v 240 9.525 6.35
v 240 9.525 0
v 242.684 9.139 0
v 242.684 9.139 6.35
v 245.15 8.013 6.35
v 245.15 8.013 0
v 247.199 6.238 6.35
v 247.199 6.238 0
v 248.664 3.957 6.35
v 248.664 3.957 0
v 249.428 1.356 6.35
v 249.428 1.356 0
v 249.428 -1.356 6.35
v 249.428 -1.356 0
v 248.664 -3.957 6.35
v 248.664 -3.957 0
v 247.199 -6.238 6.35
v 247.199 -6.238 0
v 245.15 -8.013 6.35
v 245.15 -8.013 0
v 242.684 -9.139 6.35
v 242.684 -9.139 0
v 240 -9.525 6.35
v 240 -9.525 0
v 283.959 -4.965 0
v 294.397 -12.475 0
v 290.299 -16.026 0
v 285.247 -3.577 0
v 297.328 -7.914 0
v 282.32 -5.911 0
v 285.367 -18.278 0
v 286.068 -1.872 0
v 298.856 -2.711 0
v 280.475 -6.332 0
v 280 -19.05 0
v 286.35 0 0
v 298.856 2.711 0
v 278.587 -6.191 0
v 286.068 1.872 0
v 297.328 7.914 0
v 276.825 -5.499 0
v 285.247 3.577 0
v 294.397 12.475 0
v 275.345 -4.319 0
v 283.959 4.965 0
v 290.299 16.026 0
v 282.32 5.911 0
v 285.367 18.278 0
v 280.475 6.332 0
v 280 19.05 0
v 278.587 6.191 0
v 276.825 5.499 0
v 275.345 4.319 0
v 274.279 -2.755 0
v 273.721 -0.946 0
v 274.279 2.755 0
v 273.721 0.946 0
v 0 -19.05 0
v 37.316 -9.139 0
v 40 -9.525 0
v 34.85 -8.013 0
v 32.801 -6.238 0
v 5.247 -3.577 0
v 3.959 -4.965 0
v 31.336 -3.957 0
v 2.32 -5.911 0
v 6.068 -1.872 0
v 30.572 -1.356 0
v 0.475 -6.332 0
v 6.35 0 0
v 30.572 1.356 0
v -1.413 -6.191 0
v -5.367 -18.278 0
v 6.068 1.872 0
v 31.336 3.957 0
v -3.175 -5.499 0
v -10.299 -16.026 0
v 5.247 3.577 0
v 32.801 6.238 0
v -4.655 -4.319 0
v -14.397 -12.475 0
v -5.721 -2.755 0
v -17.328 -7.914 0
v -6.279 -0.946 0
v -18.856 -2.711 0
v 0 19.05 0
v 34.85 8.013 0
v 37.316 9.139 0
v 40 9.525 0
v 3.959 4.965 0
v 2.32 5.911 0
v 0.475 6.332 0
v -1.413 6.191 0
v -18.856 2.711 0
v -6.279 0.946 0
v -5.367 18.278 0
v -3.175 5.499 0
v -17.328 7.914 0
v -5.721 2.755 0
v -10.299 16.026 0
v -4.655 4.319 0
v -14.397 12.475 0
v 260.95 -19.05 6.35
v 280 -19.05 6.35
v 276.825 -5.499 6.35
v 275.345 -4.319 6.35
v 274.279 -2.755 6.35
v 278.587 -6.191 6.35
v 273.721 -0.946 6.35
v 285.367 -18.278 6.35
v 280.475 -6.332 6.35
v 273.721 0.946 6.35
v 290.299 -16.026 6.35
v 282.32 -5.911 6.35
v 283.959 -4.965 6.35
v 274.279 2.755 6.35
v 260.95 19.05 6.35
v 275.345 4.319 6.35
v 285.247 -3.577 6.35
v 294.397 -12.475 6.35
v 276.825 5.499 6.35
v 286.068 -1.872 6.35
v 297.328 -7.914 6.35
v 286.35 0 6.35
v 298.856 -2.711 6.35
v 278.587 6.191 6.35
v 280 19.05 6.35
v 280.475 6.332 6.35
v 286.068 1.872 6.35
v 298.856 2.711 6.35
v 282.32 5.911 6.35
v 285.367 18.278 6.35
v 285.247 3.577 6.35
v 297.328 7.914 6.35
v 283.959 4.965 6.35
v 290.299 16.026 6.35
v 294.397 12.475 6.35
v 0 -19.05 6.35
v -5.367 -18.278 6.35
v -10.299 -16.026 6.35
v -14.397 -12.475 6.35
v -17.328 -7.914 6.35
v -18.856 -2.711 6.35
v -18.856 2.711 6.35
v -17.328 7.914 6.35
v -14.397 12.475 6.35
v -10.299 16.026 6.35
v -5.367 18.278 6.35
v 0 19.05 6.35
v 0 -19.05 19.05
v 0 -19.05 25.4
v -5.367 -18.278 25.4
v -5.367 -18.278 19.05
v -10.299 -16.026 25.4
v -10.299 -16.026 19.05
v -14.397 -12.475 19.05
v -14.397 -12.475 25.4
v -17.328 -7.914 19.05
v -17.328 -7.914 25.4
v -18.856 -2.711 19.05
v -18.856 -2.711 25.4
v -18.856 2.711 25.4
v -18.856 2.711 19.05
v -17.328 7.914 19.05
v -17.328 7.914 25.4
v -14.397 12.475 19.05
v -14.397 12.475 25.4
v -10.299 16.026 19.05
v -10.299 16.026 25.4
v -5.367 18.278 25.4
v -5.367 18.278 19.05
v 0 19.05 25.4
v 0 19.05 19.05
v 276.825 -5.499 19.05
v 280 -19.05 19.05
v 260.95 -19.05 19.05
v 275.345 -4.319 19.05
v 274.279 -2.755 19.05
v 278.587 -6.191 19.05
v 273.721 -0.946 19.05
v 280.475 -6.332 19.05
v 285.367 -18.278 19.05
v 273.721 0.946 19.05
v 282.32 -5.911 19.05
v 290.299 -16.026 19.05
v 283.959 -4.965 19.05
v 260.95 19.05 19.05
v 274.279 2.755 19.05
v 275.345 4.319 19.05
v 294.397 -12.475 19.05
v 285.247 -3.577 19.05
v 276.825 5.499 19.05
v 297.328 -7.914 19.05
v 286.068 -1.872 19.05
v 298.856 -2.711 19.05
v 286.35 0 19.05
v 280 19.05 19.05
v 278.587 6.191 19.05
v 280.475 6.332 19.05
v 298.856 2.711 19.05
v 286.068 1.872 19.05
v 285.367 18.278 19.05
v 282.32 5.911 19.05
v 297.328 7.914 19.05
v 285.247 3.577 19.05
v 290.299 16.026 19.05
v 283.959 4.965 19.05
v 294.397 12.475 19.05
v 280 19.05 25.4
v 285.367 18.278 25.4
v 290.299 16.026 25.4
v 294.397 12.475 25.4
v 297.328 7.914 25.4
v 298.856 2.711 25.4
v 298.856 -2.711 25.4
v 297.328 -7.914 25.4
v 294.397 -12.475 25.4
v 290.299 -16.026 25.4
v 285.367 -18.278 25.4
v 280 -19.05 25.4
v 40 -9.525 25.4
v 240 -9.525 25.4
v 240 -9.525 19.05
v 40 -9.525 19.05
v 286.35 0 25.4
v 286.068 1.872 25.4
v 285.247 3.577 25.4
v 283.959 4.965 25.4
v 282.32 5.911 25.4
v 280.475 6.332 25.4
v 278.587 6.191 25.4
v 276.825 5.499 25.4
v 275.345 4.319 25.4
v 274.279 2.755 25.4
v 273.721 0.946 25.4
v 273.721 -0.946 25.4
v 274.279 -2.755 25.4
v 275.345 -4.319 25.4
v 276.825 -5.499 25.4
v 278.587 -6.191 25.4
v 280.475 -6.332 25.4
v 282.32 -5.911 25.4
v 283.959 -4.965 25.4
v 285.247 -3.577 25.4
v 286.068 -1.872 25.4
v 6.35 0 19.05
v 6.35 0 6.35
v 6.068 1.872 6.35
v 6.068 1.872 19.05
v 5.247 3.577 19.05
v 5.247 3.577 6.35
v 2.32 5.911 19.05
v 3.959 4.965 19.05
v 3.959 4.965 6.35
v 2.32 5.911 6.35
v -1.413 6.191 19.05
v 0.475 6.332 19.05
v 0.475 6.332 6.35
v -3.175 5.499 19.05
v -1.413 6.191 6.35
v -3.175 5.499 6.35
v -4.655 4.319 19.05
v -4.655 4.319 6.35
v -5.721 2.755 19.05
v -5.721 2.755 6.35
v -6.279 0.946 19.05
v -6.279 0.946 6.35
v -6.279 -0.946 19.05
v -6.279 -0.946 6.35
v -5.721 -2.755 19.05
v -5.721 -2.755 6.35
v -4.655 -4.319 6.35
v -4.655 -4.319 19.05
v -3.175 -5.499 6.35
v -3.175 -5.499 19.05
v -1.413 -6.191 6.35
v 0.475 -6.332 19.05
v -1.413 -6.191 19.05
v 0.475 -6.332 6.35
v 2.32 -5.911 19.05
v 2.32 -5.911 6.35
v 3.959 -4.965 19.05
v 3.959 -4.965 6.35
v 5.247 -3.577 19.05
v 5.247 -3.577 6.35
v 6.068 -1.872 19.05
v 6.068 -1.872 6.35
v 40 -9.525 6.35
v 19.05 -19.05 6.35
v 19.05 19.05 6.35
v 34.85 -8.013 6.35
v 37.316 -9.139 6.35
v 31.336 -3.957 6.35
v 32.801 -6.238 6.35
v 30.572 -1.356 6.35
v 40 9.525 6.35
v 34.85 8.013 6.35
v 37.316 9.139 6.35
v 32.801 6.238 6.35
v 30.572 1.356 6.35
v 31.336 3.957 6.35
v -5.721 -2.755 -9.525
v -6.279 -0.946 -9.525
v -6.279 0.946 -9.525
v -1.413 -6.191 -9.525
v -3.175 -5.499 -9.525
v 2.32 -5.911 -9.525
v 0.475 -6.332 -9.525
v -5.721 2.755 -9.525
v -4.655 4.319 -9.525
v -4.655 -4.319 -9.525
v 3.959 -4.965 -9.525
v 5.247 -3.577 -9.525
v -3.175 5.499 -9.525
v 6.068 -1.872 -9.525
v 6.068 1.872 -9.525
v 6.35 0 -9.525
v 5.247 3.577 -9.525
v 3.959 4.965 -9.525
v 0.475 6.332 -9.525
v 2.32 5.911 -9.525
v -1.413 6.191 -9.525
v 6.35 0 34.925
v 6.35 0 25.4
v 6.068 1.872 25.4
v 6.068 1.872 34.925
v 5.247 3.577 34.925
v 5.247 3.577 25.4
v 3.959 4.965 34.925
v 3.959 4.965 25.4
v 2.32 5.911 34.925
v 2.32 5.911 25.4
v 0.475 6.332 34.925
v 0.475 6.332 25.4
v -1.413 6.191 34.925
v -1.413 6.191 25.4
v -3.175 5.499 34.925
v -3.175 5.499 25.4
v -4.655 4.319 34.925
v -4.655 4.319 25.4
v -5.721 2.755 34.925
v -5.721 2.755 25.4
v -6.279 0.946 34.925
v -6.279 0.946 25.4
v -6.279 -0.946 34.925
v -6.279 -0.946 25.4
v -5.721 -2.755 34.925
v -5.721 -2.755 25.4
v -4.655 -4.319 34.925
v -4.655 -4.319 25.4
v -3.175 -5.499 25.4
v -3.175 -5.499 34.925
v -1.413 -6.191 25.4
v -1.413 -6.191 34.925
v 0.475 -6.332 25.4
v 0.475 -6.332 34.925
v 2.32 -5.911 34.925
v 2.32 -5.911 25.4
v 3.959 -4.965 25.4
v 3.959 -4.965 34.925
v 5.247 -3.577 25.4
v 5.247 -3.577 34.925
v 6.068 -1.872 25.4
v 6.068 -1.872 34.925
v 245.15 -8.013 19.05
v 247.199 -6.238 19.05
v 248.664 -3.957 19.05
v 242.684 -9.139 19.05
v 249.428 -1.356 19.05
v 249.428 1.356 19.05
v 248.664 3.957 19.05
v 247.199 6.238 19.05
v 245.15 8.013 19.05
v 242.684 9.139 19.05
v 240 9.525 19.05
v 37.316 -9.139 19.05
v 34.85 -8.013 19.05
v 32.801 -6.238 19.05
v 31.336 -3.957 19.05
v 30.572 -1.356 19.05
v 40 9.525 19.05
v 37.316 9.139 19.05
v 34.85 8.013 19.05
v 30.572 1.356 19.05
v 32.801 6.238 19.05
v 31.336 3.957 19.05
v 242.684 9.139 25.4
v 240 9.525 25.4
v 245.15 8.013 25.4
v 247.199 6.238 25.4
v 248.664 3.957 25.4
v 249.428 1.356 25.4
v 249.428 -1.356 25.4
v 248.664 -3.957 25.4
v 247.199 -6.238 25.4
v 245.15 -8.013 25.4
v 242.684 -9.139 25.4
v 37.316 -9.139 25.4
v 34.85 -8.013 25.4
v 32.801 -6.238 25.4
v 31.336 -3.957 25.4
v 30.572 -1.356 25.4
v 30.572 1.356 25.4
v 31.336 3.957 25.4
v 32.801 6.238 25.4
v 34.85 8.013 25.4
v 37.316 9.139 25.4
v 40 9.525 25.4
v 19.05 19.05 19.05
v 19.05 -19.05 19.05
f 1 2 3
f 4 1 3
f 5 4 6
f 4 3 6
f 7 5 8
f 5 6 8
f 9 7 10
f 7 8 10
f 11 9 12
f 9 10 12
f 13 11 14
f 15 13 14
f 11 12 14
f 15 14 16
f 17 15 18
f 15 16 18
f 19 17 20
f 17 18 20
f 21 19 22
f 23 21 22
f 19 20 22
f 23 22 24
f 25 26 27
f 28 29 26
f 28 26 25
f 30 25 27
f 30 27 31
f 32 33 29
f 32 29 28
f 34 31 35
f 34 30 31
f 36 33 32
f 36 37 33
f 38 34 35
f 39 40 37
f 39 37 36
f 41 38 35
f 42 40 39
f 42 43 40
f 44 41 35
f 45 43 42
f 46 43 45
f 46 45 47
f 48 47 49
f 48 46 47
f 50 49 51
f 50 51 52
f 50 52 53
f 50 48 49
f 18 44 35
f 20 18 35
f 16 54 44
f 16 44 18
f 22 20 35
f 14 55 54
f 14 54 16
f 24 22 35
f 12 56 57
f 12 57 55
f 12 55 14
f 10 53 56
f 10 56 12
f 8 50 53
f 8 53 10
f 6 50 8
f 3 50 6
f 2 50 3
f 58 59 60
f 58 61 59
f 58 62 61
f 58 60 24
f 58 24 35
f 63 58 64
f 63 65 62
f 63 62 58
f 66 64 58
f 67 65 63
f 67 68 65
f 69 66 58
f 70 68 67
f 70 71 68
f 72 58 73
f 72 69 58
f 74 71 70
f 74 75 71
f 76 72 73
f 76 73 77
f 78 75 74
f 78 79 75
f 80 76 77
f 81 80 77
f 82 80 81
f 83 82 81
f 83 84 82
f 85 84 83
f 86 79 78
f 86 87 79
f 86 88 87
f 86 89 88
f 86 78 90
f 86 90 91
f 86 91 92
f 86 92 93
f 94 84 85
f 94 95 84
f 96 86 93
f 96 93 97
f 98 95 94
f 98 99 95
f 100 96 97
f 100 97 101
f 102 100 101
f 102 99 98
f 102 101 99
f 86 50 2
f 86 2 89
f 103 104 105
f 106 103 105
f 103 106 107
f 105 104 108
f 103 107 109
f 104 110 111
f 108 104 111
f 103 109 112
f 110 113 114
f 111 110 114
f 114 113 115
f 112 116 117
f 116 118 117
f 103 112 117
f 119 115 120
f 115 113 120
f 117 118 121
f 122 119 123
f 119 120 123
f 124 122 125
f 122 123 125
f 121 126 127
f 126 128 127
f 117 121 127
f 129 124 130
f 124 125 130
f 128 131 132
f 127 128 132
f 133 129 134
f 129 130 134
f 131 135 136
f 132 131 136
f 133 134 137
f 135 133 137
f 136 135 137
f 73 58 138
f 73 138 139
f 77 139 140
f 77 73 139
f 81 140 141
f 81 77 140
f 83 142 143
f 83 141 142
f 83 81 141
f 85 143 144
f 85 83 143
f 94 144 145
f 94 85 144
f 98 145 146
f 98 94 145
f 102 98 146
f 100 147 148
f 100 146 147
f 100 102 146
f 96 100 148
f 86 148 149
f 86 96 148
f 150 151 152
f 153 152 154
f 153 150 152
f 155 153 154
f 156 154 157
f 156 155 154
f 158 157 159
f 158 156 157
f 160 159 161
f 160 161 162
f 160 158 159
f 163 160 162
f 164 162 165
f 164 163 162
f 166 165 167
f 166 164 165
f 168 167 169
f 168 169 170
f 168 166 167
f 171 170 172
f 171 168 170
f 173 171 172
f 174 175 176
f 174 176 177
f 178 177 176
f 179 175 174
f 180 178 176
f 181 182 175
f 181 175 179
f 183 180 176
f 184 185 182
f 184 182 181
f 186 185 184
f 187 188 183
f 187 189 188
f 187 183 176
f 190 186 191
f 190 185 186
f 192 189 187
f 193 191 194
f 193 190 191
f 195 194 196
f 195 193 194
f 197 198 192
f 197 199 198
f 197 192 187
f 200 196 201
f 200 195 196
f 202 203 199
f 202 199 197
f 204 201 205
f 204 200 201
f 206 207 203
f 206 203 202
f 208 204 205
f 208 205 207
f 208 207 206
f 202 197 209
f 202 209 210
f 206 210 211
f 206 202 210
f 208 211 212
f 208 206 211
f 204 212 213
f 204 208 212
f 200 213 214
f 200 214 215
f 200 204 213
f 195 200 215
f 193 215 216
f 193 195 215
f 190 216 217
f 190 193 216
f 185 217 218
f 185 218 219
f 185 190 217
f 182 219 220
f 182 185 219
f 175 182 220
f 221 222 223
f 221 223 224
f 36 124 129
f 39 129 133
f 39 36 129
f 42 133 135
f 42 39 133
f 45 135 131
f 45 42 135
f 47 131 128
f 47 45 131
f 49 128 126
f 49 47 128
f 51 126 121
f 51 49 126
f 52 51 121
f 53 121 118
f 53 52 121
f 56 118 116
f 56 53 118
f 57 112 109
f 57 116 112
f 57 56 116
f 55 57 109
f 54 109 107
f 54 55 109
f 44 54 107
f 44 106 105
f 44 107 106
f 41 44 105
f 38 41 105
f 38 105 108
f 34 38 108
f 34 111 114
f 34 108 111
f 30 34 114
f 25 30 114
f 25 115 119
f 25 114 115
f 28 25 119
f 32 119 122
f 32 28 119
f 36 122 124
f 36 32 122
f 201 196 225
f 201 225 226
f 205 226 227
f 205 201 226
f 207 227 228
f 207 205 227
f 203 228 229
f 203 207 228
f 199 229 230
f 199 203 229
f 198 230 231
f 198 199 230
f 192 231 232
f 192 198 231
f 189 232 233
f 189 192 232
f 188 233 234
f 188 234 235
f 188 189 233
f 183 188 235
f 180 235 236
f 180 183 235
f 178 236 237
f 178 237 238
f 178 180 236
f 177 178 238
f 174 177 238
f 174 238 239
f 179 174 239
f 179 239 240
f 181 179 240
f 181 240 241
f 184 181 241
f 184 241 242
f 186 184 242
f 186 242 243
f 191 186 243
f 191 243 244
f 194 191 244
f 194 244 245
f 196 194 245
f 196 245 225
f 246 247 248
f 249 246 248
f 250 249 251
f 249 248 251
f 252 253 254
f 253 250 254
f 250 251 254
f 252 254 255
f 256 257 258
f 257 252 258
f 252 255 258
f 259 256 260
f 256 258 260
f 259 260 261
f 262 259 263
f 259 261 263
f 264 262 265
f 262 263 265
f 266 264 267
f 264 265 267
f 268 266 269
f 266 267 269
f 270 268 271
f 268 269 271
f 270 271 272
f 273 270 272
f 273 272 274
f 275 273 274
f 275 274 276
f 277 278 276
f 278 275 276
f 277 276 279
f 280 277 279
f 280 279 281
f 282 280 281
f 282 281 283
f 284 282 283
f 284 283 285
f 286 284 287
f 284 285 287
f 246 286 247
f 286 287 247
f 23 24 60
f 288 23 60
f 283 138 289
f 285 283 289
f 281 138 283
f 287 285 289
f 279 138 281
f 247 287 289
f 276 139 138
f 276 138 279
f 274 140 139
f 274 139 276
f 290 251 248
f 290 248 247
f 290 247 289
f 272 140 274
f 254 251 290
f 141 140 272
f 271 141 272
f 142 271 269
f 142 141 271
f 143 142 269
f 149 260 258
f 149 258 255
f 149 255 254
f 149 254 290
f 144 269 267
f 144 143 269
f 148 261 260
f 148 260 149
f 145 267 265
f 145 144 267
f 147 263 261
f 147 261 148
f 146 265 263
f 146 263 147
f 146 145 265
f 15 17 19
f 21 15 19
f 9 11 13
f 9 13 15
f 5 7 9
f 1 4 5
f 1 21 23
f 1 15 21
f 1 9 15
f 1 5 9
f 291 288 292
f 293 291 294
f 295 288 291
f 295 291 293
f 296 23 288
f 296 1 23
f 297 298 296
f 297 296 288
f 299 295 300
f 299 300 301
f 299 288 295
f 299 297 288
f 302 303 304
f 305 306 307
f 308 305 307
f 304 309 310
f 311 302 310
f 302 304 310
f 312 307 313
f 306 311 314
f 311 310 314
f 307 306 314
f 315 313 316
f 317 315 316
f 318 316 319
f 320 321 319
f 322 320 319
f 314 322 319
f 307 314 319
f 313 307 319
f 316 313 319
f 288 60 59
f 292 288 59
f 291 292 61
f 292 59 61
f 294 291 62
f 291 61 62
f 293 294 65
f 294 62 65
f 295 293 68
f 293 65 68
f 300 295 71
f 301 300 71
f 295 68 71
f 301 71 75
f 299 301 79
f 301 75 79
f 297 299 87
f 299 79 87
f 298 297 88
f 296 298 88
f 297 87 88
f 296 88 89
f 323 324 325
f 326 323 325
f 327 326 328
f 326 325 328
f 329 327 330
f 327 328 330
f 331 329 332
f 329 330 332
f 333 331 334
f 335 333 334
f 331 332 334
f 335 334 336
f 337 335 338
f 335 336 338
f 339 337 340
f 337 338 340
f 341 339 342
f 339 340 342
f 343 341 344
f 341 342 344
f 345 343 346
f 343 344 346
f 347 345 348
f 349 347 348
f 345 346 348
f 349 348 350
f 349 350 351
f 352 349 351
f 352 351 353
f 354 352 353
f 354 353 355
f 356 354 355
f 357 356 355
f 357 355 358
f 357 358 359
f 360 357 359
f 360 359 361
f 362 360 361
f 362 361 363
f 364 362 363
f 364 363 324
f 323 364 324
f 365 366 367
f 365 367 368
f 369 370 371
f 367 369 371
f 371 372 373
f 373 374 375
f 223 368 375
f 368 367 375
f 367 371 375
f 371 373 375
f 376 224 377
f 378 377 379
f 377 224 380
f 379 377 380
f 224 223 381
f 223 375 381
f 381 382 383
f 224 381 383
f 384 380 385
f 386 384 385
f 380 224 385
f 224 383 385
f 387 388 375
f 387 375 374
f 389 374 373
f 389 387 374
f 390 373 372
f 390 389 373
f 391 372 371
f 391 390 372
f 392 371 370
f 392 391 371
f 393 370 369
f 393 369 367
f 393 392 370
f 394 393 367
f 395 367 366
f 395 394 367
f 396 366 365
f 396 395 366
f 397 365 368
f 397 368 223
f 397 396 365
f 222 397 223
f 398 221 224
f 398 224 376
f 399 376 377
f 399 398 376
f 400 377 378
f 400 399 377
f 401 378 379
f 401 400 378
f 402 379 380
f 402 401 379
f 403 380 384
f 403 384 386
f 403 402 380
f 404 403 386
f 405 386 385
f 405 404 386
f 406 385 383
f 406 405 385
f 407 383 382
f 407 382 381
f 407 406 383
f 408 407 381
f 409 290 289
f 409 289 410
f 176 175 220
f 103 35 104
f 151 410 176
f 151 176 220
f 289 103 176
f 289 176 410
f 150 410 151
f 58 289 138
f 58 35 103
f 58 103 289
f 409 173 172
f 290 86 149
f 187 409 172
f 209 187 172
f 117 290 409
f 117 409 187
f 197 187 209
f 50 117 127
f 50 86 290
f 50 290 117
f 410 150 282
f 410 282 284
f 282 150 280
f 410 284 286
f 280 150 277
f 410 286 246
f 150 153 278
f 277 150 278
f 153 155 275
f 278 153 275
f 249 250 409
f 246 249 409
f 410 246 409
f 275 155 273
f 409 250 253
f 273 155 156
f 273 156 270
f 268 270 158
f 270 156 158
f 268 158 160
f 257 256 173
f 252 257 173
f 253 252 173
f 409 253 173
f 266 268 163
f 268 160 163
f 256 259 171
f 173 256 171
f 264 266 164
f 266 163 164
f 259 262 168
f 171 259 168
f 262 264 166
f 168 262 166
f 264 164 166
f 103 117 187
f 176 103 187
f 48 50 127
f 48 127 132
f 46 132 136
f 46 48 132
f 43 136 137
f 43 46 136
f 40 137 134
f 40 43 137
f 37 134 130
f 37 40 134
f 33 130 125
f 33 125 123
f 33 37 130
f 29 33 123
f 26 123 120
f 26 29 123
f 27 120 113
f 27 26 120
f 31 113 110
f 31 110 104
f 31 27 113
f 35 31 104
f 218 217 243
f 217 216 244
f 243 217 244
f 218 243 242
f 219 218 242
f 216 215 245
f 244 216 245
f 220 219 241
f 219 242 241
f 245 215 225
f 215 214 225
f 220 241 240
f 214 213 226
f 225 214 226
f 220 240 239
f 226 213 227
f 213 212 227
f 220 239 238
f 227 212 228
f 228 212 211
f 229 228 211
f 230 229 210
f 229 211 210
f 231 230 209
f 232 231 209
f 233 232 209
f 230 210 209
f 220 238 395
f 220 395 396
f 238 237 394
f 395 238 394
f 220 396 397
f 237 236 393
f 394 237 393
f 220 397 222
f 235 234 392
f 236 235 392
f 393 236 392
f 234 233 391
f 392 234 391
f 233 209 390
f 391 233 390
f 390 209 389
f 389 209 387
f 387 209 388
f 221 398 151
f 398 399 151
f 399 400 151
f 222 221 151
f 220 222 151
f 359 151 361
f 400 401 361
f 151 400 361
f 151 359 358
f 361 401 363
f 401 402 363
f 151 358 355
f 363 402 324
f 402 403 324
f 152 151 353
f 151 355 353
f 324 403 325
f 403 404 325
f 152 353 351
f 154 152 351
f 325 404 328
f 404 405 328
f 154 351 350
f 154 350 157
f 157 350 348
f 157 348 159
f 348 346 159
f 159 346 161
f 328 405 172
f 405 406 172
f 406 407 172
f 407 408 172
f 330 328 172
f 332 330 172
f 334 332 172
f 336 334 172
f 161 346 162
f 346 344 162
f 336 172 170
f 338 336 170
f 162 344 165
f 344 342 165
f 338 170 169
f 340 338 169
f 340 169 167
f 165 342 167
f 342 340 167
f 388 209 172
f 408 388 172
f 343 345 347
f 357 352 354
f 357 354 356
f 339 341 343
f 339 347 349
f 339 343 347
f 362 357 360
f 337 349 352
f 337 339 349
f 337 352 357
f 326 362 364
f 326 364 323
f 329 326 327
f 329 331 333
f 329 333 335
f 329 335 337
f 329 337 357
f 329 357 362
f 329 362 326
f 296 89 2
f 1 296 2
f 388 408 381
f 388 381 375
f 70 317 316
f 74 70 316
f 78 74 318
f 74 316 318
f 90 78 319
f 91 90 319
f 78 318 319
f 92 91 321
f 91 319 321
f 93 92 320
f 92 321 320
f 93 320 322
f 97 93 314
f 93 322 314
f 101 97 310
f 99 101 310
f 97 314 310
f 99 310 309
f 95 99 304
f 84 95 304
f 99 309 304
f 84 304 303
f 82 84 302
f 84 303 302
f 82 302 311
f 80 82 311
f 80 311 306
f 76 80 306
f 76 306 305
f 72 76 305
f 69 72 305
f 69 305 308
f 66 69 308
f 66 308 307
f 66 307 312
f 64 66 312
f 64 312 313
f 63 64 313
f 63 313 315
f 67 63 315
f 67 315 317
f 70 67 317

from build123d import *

# Parameters (mm, degrees)
SKETCH1_R                = 6.35
BOSS_EXTRUDE1_DEPTH      = 25.4
CUT_EXTRUDE1_DEPTH       = 6.35
SKETCH3_W                = 12.7
SKETCH3_H                = 38.1
CUT_EXTRUDE2_DEPTH       = 38.1
BOSS_EXTRUDE3_DEPTH      = 9.525
BOSS_EXTRUDE3_DEPTH_BACK = 34.925
SKETCH5_R                = 6.35


with BuildPart() as part:
    # Sketch1 → Boss-Extrude1 (new body)
    with BuildSketch(Plane.XY):
        with BuildLine():
            Line((0, 19.05), (280, 19.05))
            ThreePointArc((280, 19.05), (299.05, 0), (280, -19.05))
            Line((280, -19.05), (0, -19.05))
            ThreePointArc((0, -19.05), (-19.05, 0), (0, 19.05))
        make_face()
        Circle(SKETCH1_R, mode=Mode.SUBTRACT)
        with Locations((280, 0)):
            Circle(SKETCH1_R, mode=Mode.SUBTRACT)
    extrude(amount=BOSS_EXTRUDE1_DEPTH)

    # Sketch2 → Cut-Extrude1 (cut)
    with BuildSketch(Plane.XY.offset(25.4)):
        with BuildLine():
            Line((40, 9.525), (240, 9.525))
            ThreePointArc((240, 9.525), (249.525, 0), (240, -9.525))
            Line((240, -9.525), (40, -9.525))
            ThreePointArc((40, -9.525), (30.475, 0), (40, 9.525))
        make_face()
    cut_extrude1 = extrude(amount=-CUT_EXTRUDE1_DEPTH, mode=Mode.SUBTRACT)

    # Mirror1: Cut-Extrude1 across plane
    add(cut_extrude1.mirror(Plane.XY.offset(12.7)), mode=Mode.SUBTRACT)

    # Sketch3 → Cut-Extrude2 (cut)
    with BuildSketch(Plane.ZY.offset(19.05)):
        with Locations((12.7, 0)):
            Rectangle(SKETCH3_W, SKETCH3_H)
    cut_extrude2 = extrude(amount=-CUT_EXTRUDE2_DEPTH, mode=Mode.SUBTRACT)

    # Mirror2: Cut-Extrude2 across plane
    add(cut_extrude2.mirror(Plane.ZY.offset(-140)), mode=Mode.SUBTRACT)

    # Sketch5 → Boss-Extrude3 (add, two sides: drawn at the far end of the back side and taken through both)
    with BuildSketch(Plane.XY.offset(25.4).offset(-BOSS_EXTRUDE3_DEPTH_BACK)):
        Circle(SKETCH5_R)
    extrude(amount=BOSS_EXTRUDE3_DEPTH + BOSS_EXTRUDE3_DEPTH_BACK)


solid = part.part
